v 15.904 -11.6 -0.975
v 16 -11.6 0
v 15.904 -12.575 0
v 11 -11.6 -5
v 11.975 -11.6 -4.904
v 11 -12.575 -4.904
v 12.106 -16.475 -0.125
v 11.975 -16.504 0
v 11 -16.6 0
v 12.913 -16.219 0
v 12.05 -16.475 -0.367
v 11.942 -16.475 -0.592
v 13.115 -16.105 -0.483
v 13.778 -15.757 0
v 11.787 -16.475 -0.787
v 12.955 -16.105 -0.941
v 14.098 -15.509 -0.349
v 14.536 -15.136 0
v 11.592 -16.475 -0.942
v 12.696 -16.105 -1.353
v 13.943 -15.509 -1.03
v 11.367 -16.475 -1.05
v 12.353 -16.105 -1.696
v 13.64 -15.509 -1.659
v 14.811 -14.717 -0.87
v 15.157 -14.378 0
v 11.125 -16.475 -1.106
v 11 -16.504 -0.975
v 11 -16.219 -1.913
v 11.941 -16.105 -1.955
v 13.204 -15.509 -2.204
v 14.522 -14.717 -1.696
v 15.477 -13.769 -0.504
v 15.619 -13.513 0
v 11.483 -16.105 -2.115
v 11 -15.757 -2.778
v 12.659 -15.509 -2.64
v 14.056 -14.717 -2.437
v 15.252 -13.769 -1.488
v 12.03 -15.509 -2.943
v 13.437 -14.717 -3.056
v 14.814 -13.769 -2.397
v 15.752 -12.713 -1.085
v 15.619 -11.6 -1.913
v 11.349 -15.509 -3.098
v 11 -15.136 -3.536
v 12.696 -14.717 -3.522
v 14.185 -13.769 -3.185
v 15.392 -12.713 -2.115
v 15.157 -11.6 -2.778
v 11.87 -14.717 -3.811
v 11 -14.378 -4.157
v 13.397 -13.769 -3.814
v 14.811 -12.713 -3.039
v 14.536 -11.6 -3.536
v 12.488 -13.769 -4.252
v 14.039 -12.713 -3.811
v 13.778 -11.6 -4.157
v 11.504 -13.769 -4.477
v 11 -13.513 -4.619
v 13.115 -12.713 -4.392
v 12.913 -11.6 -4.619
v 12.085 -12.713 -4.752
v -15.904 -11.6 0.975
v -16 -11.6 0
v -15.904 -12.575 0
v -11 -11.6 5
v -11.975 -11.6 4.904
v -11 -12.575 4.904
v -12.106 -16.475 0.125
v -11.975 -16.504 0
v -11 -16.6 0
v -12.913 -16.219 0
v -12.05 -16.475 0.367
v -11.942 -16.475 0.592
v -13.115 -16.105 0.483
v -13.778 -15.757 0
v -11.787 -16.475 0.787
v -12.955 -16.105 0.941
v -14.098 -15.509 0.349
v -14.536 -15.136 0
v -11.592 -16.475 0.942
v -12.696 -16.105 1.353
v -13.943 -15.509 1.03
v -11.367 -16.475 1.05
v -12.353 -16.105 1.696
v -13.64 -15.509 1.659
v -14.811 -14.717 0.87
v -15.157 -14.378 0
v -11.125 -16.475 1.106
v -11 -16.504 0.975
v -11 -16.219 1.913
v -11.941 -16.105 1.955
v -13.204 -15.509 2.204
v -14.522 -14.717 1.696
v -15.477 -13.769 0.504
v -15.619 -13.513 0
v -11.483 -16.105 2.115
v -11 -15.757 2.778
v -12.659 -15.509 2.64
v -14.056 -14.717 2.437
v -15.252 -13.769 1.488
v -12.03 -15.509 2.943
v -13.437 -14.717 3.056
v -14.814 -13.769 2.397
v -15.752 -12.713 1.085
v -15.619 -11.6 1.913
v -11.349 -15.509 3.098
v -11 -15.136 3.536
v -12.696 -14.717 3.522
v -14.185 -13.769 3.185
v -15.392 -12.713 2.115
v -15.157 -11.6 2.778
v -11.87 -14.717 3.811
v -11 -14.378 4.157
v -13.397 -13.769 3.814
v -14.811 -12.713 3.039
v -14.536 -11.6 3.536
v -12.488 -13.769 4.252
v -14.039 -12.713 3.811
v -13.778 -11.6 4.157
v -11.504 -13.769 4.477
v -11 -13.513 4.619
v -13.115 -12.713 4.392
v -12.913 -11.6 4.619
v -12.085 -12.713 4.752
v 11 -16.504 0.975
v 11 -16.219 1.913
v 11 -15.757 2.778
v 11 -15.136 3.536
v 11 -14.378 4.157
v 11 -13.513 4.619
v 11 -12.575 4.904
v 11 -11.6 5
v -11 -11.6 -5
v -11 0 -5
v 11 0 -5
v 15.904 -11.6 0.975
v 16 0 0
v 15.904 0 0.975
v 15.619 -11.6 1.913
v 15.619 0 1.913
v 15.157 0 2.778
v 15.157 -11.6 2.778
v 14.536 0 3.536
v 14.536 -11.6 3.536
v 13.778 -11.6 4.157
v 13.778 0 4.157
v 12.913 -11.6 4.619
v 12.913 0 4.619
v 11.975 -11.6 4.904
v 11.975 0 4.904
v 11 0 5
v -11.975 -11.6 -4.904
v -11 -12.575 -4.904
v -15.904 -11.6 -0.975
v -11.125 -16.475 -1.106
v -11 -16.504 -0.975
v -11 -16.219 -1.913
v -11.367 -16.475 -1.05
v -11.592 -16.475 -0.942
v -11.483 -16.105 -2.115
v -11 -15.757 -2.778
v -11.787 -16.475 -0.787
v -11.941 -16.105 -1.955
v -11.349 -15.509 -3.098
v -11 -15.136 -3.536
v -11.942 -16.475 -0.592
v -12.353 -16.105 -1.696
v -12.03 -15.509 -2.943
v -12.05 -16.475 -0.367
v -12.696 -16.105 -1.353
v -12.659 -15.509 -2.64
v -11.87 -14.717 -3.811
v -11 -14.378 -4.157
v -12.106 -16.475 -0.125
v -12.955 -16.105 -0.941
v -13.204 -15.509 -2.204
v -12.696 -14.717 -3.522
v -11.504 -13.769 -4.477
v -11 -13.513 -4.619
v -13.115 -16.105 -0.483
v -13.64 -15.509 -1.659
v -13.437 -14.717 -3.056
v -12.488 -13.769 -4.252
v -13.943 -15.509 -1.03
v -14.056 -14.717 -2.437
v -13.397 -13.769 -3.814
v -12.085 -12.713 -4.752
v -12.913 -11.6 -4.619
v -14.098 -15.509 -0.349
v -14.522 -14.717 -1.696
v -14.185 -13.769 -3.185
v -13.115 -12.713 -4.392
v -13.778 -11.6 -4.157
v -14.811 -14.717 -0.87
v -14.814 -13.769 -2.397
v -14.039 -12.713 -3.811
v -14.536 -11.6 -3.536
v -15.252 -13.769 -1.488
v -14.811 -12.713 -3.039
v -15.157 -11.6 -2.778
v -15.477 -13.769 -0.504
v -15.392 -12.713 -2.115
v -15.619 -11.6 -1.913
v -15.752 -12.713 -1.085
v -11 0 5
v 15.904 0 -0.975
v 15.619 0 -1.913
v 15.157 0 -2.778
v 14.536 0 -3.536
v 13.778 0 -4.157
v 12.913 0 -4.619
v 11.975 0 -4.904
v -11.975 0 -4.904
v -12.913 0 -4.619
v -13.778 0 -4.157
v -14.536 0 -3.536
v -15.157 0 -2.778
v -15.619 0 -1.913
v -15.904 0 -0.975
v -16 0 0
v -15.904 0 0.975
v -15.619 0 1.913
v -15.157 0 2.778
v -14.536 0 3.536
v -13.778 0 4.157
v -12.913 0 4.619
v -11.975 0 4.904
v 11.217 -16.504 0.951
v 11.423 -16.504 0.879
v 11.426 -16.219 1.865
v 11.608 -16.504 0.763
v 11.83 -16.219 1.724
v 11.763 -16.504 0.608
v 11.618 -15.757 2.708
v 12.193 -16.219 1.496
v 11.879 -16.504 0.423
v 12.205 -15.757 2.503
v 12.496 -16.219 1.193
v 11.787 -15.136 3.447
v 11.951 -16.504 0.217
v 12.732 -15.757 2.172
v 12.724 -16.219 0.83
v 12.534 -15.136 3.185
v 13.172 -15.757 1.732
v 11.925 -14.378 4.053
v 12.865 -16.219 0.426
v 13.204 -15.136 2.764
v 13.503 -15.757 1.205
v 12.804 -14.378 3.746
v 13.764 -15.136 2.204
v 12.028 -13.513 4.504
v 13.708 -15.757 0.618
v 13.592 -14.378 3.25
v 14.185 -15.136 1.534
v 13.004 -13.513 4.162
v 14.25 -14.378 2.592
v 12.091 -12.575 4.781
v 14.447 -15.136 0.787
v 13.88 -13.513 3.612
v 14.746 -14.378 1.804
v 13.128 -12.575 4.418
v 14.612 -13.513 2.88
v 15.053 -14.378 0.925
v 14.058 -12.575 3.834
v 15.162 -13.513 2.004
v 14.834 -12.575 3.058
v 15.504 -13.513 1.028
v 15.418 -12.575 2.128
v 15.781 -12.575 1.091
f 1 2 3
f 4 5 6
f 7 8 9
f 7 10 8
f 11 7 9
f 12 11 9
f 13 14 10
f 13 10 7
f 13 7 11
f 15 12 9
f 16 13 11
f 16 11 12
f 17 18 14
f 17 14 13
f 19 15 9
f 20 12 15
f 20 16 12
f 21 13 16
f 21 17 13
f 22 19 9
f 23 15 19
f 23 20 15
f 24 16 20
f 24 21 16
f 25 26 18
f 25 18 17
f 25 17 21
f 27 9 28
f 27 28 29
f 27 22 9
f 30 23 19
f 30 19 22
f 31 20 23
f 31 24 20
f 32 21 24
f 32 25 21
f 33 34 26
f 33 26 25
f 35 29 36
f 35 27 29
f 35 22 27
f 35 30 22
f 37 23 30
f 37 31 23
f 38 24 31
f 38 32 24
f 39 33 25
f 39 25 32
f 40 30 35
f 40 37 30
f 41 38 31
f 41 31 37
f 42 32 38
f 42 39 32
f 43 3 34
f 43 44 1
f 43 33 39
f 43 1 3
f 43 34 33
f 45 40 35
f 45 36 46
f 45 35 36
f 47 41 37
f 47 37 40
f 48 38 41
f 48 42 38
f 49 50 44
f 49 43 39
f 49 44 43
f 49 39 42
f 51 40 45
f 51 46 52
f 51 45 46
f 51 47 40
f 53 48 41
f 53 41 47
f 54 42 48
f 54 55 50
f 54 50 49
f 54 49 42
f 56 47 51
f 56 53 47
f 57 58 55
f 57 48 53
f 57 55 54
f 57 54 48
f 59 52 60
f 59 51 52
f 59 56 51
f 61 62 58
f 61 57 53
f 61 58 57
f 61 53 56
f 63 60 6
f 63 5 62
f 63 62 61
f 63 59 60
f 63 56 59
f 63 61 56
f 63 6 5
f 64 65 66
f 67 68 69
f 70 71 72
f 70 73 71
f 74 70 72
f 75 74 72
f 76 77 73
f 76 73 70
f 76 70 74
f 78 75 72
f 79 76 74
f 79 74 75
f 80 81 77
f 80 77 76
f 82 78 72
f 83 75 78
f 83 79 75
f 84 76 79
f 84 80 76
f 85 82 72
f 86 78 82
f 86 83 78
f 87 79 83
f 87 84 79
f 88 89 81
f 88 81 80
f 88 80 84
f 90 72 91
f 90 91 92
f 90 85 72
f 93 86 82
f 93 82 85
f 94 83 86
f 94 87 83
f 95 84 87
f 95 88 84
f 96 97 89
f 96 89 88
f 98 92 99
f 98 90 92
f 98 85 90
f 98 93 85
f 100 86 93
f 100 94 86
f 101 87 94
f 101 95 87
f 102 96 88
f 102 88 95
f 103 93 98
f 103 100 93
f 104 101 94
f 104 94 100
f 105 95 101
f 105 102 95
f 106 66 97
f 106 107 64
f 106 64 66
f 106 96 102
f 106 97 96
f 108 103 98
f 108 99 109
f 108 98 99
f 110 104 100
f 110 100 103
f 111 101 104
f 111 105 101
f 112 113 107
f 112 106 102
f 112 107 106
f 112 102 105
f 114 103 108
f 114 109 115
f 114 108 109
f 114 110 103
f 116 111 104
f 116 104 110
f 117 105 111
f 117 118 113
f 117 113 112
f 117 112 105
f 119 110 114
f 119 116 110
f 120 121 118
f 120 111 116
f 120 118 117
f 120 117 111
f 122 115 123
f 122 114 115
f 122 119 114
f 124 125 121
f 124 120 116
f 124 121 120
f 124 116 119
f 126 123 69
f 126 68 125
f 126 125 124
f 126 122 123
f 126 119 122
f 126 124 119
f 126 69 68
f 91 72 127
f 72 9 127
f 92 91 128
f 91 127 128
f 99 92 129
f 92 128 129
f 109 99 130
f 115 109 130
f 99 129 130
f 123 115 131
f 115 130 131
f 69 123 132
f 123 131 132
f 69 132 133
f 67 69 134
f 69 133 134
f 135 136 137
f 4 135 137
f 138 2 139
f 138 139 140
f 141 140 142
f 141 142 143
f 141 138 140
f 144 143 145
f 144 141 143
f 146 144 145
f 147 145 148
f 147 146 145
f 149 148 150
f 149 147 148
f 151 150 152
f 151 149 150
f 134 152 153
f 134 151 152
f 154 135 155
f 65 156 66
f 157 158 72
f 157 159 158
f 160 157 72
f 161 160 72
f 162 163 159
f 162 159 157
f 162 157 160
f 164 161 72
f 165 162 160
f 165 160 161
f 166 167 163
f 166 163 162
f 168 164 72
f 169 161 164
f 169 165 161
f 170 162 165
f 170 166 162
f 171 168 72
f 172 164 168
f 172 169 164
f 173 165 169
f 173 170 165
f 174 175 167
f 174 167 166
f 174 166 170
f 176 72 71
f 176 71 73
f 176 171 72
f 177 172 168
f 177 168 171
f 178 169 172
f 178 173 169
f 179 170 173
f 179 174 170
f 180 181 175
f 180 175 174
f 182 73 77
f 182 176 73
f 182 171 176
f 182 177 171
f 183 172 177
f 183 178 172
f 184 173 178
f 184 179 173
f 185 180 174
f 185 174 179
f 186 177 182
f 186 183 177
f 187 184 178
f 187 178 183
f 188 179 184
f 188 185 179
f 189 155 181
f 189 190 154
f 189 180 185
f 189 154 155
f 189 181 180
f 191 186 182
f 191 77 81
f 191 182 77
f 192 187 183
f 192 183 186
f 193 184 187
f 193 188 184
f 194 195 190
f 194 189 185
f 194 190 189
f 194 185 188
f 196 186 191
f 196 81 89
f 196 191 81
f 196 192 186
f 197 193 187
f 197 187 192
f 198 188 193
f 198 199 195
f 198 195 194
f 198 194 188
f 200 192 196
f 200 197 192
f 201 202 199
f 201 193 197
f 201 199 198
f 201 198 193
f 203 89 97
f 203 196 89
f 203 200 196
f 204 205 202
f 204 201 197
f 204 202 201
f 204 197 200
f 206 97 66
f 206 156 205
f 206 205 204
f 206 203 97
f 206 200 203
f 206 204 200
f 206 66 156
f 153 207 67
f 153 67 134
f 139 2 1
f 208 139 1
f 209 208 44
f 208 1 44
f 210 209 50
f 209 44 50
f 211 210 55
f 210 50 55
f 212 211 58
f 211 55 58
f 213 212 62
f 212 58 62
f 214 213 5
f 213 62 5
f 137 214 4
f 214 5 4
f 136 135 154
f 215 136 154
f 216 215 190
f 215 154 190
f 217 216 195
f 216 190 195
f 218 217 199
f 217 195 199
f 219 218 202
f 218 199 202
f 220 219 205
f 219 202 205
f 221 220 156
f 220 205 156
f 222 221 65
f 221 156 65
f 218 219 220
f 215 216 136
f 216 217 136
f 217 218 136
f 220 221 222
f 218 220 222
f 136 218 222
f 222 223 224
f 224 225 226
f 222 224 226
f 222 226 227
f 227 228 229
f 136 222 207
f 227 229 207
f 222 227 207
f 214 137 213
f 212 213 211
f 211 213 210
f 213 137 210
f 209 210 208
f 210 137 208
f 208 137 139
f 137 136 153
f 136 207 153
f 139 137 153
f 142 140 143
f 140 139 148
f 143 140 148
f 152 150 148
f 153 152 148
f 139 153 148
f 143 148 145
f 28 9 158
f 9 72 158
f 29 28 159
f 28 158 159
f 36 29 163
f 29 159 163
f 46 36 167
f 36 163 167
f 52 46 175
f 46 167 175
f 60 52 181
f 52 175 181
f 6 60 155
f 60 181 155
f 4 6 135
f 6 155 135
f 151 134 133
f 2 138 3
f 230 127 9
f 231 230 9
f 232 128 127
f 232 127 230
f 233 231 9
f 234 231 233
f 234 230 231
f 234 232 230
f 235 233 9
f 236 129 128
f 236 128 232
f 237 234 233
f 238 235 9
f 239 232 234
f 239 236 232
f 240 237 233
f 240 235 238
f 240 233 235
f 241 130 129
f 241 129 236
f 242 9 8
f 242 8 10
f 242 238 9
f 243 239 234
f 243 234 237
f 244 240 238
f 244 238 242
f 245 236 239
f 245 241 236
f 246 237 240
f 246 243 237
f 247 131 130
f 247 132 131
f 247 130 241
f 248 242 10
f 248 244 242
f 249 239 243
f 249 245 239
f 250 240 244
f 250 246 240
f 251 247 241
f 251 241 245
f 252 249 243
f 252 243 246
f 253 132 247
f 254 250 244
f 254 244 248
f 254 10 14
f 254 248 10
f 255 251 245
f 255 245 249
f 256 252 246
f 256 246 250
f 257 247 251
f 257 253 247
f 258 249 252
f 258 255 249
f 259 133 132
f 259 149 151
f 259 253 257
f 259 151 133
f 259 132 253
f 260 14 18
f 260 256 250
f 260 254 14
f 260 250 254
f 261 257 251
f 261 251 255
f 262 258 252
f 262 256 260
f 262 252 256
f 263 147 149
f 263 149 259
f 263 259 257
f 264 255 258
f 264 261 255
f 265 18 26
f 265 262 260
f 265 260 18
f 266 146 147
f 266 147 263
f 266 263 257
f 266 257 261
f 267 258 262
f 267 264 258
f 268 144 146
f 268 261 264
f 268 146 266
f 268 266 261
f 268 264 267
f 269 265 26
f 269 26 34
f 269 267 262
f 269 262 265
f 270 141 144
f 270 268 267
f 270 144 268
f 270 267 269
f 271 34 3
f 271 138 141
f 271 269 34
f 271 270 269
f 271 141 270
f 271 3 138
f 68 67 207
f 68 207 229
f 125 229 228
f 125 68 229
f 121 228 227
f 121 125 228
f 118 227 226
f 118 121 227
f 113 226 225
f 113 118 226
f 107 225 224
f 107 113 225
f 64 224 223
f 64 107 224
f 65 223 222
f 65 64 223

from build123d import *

# Parameters (mm, degrees)
F0_W     = 32
F0_H     = 10
F1_DEPTH = 16.6
F2_R     = 5
F3_R     = 4.99999
F4_R     = 4.99999


# Not quite as in the source:
# - a fillet or chamfer is up to 0.001 mm smaller than in the source, because OpenCascade refuses the exact size


with BuildPart() as f1:
    # F0 (on Front) → F1 (new body)
    with BuildSketch(Plane.XZ):
        Rectangle(F0_W, F0_H)
    extrude(amount=F1_DEPTH)

    # F2
    f2_edges = [f1.edges().sort_by_distance(p)[0] for p in [
        (16, -8.3, 5),
    ]]
    fillet(f2_edges, radius=F2_R)

    # F3 (radius 5 in the source; OpenCascade refuses exactly that, so slightly less here)
    f3_edges = [f1.edges().sort_by_distance(p)[0] for p in [
        (-16, -8.3, 5),
        (16, -8.3, -5),
        (-16, -8.3, -5),
    ]]
    fillet(f3_edges, radius=F3_R)

    # F4 (radius 5 in the source; OpenCascade refuses exactly that, so slightly less here)
    f4_edges = [f1.edges().sort_by_distance(p)[0] for p in [
        (-5e-06, -16.6, 5),
    ]]
    fillet(f4_edges, radius=F4_R)


solid = f1.part
